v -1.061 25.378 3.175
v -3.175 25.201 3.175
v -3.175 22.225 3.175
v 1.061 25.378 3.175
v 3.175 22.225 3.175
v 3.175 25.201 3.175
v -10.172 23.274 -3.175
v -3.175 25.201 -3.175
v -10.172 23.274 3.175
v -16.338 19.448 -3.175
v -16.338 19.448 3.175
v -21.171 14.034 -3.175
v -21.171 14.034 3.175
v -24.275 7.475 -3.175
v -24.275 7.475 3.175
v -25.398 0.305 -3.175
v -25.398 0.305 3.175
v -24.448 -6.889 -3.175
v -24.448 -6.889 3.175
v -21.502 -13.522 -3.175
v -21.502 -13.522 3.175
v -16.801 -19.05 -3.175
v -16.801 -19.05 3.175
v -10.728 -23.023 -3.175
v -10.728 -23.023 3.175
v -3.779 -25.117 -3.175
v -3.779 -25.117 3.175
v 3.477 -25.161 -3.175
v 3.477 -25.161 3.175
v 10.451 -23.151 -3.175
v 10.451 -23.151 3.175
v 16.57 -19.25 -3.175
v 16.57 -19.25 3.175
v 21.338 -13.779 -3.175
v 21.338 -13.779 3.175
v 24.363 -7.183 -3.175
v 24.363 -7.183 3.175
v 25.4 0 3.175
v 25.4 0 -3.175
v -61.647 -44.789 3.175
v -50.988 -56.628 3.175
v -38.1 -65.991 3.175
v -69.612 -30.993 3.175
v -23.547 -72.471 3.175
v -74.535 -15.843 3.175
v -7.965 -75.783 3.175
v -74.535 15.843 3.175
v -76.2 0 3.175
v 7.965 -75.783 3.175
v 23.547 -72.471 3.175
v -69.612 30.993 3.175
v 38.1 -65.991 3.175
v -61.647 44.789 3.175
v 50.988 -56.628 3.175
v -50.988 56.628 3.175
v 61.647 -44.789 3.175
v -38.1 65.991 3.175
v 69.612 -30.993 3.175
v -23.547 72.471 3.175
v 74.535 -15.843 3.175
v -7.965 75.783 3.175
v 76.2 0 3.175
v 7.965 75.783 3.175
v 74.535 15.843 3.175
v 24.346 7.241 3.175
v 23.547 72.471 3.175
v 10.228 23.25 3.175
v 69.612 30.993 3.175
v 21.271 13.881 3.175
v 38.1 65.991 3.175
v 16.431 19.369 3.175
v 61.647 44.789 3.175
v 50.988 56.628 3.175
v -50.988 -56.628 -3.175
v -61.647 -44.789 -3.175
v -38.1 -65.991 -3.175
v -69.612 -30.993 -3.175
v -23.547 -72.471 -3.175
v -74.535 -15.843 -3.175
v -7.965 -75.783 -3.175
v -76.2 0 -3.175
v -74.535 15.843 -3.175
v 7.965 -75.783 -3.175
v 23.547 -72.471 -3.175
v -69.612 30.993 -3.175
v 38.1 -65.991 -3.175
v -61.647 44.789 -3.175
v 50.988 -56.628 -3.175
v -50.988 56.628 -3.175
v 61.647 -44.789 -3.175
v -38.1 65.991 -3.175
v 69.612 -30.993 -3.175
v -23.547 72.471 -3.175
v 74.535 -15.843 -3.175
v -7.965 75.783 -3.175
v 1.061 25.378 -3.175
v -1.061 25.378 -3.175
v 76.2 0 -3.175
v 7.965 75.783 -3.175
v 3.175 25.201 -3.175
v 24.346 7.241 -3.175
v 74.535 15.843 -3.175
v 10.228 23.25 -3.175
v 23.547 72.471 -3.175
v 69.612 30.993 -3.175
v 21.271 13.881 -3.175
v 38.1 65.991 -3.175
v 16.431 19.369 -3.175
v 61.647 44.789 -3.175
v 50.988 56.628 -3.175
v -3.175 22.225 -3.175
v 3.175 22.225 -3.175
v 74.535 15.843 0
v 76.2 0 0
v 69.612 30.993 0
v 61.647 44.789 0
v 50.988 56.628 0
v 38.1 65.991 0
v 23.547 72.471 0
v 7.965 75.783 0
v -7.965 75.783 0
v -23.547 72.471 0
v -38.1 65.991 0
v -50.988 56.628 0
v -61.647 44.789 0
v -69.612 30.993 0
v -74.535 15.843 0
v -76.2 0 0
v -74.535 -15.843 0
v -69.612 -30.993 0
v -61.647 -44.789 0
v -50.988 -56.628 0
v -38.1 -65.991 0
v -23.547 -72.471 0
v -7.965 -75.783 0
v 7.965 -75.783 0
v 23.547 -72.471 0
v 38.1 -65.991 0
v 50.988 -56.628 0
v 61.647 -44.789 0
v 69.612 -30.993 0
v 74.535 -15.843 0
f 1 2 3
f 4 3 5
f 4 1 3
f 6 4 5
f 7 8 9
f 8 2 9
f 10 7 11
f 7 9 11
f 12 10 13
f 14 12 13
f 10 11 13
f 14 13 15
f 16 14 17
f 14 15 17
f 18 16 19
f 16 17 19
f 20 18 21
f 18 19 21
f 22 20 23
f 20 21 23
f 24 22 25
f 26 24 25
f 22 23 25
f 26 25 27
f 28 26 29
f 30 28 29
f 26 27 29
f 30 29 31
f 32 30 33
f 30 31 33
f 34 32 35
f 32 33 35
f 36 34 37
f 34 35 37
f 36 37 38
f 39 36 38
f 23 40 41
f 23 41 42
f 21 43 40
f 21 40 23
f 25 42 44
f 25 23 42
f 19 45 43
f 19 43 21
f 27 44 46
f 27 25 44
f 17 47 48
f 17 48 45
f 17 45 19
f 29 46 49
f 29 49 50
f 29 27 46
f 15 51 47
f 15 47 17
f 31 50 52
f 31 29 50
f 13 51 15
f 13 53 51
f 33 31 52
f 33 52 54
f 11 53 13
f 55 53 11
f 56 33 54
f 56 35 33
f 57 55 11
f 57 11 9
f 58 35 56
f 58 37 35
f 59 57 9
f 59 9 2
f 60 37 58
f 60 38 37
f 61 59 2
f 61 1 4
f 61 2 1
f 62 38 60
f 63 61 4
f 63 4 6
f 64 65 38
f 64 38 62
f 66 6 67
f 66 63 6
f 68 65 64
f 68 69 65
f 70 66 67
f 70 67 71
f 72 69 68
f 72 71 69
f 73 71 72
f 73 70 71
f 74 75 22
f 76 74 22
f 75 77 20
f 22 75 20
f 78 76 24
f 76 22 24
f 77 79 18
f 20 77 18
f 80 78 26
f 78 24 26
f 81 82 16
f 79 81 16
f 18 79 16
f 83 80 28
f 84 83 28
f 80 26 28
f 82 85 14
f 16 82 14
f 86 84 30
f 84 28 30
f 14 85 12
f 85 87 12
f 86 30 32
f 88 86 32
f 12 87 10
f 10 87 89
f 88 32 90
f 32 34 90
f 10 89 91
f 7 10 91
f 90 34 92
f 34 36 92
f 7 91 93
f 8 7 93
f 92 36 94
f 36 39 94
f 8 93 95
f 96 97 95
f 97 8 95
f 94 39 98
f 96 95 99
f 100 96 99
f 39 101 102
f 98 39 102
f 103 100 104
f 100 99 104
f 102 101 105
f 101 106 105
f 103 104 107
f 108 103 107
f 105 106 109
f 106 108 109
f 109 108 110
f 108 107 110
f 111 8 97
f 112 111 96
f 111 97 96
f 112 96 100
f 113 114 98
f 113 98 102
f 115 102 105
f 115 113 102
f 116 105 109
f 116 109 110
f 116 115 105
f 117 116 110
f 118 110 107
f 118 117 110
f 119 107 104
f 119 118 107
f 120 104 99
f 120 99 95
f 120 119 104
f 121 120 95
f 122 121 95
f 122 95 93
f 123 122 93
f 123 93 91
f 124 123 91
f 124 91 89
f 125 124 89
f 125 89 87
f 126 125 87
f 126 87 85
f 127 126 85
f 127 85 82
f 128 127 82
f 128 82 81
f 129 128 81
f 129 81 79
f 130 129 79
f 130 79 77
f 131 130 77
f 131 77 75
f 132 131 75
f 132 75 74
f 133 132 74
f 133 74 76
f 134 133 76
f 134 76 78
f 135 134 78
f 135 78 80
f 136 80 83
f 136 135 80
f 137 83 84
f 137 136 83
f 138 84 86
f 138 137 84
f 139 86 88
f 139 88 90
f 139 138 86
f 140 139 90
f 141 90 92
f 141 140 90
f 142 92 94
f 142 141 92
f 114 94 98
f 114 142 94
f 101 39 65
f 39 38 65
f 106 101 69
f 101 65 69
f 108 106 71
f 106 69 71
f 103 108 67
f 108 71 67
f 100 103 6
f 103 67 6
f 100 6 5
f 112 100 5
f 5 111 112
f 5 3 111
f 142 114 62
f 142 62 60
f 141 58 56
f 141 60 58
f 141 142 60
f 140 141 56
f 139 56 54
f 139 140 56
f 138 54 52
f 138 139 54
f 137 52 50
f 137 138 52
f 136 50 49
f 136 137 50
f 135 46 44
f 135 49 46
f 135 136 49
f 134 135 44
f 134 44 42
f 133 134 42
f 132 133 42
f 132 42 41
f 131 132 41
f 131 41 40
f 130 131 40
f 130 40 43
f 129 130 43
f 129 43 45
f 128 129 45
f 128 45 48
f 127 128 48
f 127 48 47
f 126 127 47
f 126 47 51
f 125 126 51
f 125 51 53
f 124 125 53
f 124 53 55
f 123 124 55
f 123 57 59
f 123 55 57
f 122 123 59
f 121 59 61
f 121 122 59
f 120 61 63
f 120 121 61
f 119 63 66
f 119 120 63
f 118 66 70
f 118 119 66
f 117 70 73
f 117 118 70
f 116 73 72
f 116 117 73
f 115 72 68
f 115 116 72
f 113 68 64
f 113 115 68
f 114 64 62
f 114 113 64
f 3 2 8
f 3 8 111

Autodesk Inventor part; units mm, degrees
ref_plane "YZ Plane" through (0, 0, 0) normal (1, 0, 0) x (0, 1, 0)
ref_plane "XZ Plane" through (0, 0, 0) normal (0, 1, 0) x (-1, 0, 0)
ref_plane "XY Plane" through (0, 0, 0) normal (0, 0, 1) x (1, 0, 0)
sketch "Sketch1" plane through (0, 0, 0) normal (0, 0, 1) x (1, 0, 0)
  circle A0 centre (0, 0) radius 76.2
  dimension "d0" = 152.4
extrude "Extrusion1" add sketch "Sketch1" along normal mid plane 6.35
sketch "Sketch3" plane through (0, 0, 3.175) normal (0, 0, 1) x (1, 0, 0)
  circle A0 centre (0, 0) radius 25.4
  dimension "d8" = 50.8
extrude "Extrusion3" cut sketch "Sketch3" against normal through all
sketch "Sketch5" plane through (0, 0, 3.175) normal (0, 0, 1) x (1, 0, 0)
  arc A0 (3.175, 25.2008) -> (-3.175, 25.2008) centre (0, 0) ccw
  circle A1 centre (0, 0) radius 25.4 projected
  line L0 (-3.175, 25.2008) -> (-3.175, 22.225)
  line L1 (3.175, 25.2008) -> (3.175, 22.225)
  line L2 (-3.175, 22.225) -> (3.175, 22.225)
  dimension "d11" = 3.175
  dimension "d13" = 6.35
extrude "Extrusion4" add sketch "Sketch5" against normal blind 6.35 contours L1 L2 L0 A0
sketch "Sketch7" plane through (0, 0, -3.175) normal (0, 0, -1) x (-1, 0, 0)
  arc A0 (3.175, -25.2008) -> (20.237, -15.35) centre (0, 0) ccw projected
  circle A1 centre (0, 0) radius 38.1
  circle A2 centre (0, 0) radius 4.7625
  dimension "d19" = 76.2
  dimension "d20" = 9.525
properties part number "6x1_4-testSampleGear" material "PC/ABS Plastic"
